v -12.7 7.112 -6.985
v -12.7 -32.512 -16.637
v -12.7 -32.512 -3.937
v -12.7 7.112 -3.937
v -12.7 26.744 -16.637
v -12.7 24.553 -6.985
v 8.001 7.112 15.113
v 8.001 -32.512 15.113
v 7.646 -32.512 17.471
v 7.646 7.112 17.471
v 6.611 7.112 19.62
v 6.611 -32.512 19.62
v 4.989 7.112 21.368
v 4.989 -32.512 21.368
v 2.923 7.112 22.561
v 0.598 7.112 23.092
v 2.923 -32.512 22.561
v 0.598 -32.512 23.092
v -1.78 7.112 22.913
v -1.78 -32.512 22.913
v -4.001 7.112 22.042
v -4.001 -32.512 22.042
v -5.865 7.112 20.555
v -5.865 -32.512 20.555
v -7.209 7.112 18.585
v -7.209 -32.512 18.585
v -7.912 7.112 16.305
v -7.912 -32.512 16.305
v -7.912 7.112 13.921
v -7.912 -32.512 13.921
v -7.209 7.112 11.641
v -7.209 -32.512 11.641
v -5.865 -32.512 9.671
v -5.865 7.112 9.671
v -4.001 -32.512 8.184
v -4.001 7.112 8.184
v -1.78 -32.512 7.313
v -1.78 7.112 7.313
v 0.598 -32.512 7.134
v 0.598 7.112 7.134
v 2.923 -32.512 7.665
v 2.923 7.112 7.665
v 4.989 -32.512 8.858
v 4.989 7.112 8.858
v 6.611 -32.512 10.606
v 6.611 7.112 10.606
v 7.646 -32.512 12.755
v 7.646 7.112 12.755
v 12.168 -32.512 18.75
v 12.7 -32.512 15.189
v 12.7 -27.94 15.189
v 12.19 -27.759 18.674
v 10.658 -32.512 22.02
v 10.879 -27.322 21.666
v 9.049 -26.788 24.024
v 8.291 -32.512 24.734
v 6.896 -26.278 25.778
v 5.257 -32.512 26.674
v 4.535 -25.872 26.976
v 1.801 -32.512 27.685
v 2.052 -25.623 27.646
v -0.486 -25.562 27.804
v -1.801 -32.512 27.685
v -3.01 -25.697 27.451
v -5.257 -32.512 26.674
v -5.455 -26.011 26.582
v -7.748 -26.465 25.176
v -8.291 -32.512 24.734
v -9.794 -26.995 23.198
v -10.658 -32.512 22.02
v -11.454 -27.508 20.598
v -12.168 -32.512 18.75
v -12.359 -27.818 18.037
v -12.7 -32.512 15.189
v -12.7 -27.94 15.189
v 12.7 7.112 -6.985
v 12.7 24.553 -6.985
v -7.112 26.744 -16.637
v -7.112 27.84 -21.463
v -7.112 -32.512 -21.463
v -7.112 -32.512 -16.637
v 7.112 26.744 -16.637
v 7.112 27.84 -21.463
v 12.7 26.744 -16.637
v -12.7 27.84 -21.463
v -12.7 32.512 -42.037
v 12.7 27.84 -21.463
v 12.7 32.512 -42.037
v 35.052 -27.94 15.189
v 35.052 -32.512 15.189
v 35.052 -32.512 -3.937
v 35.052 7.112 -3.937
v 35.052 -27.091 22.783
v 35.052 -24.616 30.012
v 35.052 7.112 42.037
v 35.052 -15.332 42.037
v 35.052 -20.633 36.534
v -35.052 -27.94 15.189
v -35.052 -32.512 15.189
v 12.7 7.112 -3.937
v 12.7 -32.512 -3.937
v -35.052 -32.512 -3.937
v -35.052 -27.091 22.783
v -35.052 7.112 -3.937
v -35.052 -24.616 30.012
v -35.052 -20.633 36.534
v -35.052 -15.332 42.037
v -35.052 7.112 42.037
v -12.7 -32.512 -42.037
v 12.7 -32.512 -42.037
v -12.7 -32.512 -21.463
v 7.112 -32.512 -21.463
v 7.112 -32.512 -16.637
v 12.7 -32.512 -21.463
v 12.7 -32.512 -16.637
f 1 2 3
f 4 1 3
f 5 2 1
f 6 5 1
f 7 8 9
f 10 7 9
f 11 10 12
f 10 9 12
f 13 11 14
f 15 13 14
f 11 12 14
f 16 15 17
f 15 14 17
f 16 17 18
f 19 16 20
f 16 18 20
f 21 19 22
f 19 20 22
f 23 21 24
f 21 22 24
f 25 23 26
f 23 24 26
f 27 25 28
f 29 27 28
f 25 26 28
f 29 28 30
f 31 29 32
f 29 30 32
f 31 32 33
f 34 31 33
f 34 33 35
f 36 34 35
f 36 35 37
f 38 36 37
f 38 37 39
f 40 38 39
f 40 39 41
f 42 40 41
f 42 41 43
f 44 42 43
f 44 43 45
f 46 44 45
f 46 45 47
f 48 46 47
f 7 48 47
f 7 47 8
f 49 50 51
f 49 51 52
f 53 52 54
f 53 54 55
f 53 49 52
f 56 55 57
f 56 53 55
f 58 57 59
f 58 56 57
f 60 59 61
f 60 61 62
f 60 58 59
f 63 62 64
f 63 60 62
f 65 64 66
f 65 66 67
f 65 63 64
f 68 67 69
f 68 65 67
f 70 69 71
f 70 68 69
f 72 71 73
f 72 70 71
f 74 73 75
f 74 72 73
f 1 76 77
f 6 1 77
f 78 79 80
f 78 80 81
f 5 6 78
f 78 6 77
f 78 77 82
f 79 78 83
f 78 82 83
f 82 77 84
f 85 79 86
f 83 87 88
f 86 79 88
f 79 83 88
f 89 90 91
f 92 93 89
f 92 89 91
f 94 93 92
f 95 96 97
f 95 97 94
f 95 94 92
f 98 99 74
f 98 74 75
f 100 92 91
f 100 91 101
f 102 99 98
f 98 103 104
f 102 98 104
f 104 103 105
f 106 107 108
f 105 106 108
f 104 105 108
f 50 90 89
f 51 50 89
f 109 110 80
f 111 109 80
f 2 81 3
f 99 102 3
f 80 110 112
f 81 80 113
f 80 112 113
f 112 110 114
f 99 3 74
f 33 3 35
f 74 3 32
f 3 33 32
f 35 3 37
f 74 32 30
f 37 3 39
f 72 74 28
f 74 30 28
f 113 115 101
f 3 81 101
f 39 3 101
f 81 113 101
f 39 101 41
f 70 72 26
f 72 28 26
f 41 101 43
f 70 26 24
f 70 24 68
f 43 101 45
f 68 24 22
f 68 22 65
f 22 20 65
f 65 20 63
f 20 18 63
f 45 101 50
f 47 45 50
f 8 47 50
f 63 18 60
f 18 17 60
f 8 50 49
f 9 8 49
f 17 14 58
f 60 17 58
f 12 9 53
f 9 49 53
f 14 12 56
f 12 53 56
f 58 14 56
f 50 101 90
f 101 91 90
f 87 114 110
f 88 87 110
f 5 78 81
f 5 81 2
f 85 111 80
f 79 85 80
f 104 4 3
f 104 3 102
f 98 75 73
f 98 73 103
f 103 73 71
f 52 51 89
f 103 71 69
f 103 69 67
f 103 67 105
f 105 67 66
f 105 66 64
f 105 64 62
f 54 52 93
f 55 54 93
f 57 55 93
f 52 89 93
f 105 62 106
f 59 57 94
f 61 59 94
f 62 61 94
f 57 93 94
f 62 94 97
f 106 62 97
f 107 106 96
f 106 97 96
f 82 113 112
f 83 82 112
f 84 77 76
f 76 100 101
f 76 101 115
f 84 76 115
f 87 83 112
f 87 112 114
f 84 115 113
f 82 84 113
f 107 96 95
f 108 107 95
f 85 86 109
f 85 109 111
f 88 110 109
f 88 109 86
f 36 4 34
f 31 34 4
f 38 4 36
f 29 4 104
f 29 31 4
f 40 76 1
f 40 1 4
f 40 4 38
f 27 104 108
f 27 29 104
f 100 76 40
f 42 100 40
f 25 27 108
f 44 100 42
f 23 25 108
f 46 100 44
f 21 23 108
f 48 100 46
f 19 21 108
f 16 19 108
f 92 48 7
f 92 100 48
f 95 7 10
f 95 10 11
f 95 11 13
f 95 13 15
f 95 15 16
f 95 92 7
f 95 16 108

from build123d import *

# Parameters (mm, degrees)
F0_W      = 65.024
F0_H      = 84.074
F1_DEPTH  = 35.052
F3_DEPTH  = 127
F4_W      = 72.461889
F4_H      = 59.973377
F5_DEPTH  = 127
F7_DEPTH  = 127
F9_DEPTH  = 127
F10_R     = 12.7
F11_DEPTH = 25.4
F12_R     = 8.001
F13_DEPTH = 65.025


with BuildPart() as f1:
    # F0 (on Right) → F1 (new body, symmetric)
    with BuildSketch(Plane.YZ):
        Rectangle(F0_W, F0_H)
    extrude(amount=F1_DEPTH, both=True)

    # F2 (on Front) → F3 (cut, symmetric)
    with BuildSketch(Plane.XZ):
        Polygon((-12.7, -3.937), (-44.45, -3.937), (-44.45, -67.437), (-12.7, -67.437), (-12.7, -21.463), (-7.112, -21.463), (-7.112, -16.637), (-12.7, -16.637), align=None)
        Polygon((44.45, -3.937), (12.7, -3.937), (12.7, -16.637), (7.112, -16.637), (7.112, -21.463), (12.7, -21.463), (12.7, -67.437), (44.45, -67.437), align=None)
    extrude(amount=F3_DEPTH, both=True, mode=Mode.SUBTRACT)

    # F4 (on Right) → F5 (cut, symmetric)
    with BuildSketch(Plane.YZ):
        with Locations((43.342944, 23.001689)):
            Rectangle(F4_W, F4_H)
    extrude(amount=F5_DEPTH, both=True, mode=Mode.SUBTRACT)

    # F6 (on face) → F7 (cut, symmetric)
    with BuildSketch(Plane.YZ.offset(12.7)):
        Polygon((22.86, 0.46973), (32.512, -42.037), (52.074212, -65.31479), (55.857351, 0.46973), align=None)
    extrude(amount=F7_DEPTH, both=True, mode=Mode.SUBTRACT)

    # F8 (on Right) → F9 (cut, symmetric)
    with BuildSketch(Plane.YZ):
        with BuildLine():
            ThreePointArc((-27.939918, 15.188745), (-17.613927, 39.957944), (7.20457, 50.164878))
            Line((7.20457, 50.164878), (-34.922153, 66.136815))
            Line((-34.922153, 66.136815), (-47.838565, 20.211793))
            Line((-47.838565, 20.211793), (-47.838565, 15.188745))
            Line((-47.838565, 15.188745), (-27.939918, 15.188745))
        make_face()
    extrude(amount=F9_DEPTH, both=True, mode=Mode.SUBTRACT)

    # F10 (on face) → F11 (join)
    with BuildSketch(Plane.XZ.offset(32.512)):
        with Locations((0, 15.113)):
            Circle(F10_R)
    extrude(amount=-F11_DEPTH)

    # F12 (on face) → F13 (cut, through all)
    with BuildSketch(Plane.XZ.offset(32.512)):
        with Locations((0, 15.113)):
            Circle(F12_R)
    extrude(amount=-F13_DEPTH, mode=Mode.SUBTRACT)


solid = f1.part
